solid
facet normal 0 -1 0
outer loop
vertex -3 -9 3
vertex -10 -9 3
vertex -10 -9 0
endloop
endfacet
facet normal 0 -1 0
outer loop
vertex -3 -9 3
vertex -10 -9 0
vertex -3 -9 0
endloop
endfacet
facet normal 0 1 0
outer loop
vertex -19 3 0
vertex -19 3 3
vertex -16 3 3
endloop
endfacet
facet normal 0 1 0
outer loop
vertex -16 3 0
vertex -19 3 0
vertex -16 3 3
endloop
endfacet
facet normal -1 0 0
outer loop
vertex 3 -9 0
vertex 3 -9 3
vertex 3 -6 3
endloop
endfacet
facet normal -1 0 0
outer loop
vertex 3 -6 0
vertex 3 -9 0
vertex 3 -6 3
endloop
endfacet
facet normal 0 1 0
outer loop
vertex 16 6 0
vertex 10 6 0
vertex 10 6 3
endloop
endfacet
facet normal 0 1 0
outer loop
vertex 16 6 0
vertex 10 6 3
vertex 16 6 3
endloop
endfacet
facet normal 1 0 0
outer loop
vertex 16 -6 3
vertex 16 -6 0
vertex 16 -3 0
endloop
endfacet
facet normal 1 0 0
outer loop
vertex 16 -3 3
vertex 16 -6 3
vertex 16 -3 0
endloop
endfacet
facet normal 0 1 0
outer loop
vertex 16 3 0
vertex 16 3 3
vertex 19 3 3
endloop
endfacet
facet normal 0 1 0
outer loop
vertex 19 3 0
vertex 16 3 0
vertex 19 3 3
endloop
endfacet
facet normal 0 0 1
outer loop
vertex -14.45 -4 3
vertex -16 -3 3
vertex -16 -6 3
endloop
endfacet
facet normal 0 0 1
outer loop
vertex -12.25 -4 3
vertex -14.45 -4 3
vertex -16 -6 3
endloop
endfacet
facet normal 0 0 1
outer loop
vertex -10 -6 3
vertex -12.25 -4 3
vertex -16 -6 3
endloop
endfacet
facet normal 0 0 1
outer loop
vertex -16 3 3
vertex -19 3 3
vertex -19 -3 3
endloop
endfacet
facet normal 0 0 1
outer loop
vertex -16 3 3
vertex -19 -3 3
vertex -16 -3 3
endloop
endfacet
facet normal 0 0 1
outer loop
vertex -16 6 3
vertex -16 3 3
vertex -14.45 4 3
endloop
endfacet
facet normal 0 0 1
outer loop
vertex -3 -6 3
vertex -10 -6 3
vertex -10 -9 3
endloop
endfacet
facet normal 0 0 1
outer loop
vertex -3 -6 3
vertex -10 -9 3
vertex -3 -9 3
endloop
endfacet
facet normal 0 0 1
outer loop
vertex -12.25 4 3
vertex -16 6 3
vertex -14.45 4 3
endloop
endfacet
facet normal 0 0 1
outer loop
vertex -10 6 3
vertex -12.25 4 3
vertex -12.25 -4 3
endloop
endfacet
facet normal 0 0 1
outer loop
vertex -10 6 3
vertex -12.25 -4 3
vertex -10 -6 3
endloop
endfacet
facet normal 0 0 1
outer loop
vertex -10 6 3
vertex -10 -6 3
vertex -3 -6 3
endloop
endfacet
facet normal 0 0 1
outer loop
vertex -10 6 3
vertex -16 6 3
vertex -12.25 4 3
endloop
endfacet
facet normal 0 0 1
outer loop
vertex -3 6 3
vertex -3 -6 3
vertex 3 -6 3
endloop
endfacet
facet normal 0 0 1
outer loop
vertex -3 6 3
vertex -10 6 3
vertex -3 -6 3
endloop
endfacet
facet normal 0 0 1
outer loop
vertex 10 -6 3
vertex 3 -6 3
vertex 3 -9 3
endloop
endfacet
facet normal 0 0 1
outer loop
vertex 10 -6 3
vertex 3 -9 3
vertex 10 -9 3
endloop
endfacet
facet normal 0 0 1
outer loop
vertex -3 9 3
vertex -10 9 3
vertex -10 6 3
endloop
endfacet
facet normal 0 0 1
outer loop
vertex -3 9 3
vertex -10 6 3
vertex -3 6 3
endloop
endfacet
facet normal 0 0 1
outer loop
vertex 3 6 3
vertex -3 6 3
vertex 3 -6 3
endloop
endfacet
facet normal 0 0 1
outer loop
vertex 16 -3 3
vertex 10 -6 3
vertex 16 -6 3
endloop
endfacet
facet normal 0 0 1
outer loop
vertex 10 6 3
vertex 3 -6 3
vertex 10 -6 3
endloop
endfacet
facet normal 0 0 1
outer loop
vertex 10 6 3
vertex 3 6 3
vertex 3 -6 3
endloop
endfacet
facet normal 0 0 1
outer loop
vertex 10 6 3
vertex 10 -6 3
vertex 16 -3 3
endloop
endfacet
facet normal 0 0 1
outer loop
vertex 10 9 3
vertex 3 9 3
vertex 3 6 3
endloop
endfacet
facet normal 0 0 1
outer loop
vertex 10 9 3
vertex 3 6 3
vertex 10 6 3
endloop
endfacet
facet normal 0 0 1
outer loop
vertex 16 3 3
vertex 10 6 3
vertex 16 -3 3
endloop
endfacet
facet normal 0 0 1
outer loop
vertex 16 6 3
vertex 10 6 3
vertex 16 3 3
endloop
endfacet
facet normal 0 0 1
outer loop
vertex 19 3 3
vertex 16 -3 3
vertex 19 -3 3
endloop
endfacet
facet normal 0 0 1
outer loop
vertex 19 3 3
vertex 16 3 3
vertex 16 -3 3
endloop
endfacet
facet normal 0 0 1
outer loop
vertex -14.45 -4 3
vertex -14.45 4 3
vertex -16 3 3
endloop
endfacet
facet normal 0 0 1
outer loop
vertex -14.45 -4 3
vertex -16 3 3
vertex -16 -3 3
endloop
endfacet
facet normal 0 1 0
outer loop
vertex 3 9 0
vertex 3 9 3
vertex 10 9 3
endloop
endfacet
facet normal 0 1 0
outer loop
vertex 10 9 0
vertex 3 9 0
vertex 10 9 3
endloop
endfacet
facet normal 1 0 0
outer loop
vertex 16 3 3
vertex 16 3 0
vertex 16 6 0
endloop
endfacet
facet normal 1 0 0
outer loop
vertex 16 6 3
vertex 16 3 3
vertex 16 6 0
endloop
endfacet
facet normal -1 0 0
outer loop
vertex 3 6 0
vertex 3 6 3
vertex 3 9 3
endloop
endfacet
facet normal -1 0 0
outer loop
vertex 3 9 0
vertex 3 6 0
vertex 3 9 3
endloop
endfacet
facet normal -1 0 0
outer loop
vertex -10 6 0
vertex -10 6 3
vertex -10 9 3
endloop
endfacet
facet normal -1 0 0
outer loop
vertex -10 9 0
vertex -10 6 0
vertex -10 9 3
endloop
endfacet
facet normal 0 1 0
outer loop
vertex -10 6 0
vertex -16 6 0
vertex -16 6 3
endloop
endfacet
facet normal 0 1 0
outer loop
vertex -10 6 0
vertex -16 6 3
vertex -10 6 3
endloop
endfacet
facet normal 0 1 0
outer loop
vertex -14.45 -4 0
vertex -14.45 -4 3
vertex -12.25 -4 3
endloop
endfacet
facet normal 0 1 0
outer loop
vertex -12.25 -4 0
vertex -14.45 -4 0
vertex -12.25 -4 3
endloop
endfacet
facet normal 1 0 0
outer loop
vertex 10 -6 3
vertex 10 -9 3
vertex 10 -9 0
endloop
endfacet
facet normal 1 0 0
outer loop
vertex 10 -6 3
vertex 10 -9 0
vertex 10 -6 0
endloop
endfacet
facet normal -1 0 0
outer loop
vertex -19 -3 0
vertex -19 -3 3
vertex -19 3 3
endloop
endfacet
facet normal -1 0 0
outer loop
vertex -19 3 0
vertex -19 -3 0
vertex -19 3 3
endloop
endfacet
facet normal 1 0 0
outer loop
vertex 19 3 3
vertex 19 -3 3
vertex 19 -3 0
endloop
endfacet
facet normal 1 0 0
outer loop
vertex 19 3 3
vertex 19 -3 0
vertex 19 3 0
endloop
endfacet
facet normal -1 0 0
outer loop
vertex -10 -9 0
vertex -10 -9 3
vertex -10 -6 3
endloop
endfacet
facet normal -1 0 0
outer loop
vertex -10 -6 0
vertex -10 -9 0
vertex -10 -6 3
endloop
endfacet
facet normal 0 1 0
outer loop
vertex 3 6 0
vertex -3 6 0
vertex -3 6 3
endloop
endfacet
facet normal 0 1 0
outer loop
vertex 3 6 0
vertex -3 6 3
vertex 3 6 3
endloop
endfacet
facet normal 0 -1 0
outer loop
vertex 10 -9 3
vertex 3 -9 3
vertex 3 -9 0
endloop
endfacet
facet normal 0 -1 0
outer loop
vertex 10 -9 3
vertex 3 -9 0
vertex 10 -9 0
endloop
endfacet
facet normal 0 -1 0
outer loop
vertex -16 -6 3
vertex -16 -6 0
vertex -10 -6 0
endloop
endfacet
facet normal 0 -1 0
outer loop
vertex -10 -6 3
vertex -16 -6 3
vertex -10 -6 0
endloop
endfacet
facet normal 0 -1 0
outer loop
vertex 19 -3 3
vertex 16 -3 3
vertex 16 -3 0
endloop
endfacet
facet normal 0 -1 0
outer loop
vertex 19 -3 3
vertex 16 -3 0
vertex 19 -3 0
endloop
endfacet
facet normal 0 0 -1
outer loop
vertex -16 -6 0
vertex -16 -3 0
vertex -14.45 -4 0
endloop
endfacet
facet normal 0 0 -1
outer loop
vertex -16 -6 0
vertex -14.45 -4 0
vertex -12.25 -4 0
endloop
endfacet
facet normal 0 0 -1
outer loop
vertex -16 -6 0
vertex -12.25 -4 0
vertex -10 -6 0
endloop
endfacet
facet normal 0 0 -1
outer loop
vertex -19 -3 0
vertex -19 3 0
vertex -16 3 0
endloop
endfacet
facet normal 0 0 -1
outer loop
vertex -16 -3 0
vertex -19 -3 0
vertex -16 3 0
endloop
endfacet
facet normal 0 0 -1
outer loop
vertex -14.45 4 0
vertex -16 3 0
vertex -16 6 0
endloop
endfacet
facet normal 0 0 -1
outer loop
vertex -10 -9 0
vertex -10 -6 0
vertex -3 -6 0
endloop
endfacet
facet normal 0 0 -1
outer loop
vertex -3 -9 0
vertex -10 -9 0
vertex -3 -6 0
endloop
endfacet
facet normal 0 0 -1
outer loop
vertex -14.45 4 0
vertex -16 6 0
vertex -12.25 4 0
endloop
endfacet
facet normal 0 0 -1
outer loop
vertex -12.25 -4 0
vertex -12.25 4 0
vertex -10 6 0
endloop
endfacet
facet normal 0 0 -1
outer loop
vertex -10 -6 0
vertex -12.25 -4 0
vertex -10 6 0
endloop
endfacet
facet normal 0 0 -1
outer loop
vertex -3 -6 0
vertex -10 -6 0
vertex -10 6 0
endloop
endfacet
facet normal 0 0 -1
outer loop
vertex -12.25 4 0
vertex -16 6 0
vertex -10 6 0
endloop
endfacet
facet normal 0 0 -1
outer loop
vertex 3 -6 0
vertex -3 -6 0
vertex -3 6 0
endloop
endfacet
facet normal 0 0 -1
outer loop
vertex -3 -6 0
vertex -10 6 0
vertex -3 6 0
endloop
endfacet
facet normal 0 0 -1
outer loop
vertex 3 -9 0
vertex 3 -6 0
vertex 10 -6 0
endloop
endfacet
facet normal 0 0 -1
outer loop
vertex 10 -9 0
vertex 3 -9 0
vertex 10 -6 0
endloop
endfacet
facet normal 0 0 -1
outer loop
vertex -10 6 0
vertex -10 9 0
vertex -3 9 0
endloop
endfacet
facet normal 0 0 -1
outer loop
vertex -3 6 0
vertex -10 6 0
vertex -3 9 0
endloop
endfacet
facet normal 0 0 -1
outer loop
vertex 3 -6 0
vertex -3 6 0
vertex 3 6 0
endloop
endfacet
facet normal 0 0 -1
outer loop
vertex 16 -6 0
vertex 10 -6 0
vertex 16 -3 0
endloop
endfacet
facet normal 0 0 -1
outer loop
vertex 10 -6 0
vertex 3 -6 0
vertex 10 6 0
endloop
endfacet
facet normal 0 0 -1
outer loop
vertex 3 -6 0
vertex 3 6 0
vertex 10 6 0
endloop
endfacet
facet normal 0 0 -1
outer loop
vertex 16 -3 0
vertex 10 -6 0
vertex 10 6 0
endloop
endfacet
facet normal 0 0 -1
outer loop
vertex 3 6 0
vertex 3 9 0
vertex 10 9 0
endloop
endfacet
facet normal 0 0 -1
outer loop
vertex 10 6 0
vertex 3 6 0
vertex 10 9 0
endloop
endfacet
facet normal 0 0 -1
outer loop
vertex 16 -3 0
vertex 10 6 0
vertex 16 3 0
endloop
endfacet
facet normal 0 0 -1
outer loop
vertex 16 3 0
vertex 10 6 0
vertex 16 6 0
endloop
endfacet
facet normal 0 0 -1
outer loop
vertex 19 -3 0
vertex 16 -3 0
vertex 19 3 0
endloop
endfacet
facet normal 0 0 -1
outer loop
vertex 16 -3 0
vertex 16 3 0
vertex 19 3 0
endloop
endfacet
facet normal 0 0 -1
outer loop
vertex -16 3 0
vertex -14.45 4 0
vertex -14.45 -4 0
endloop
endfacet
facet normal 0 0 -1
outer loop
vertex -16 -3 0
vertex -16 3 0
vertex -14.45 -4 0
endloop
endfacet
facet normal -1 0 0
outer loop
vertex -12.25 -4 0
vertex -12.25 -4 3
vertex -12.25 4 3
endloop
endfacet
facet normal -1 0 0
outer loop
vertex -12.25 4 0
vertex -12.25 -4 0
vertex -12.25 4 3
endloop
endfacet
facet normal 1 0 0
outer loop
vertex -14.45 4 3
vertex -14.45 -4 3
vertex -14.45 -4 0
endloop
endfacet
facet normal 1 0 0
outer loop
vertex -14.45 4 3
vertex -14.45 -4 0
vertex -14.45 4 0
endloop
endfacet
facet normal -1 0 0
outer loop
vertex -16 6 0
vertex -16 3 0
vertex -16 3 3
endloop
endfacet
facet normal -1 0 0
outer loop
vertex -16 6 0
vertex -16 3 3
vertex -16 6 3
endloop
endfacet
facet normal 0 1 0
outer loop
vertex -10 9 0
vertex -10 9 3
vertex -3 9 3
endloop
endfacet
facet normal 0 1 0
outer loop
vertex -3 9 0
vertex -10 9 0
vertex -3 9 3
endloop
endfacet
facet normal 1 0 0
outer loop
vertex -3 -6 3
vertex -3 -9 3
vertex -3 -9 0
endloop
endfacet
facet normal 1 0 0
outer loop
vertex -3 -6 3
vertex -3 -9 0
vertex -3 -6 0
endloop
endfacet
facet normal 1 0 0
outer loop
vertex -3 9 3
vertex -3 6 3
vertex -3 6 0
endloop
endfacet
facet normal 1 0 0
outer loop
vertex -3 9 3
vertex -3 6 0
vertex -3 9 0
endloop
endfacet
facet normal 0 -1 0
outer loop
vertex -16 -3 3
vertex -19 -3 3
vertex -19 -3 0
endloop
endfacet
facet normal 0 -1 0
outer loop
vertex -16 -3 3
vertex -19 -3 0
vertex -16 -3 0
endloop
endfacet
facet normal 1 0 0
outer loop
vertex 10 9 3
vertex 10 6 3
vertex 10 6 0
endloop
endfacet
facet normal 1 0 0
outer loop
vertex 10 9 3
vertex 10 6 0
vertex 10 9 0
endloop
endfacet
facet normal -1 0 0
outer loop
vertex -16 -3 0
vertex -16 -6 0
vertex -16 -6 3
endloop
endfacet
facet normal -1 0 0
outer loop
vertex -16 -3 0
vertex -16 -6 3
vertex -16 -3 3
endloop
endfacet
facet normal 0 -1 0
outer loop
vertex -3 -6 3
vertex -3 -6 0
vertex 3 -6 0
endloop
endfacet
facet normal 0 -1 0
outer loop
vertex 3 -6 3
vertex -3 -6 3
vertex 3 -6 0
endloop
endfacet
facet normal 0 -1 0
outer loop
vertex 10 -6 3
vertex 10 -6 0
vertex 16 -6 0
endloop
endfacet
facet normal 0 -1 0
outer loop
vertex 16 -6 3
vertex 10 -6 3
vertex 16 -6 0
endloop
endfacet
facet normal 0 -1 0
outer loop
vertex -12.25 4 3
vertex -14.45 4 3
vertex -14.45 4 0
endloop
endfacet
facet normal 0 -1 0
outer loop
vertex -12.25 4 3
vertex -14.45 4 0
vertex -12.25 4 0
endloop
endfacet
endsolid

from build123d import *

# Parameters (mm, degrees)
SKETCH2_W           = 32
SKETCH2_H           = 12
BOSS_EXTRUDE1_DEPTH = 3
SKETCH3_W           = 7
SKETCH3_H           = 3
SKETCH3_W_2         = 3
SKETCH3_H_2         = 6
BOSS_EXTRUDE3_DEPTH = 3
SKETCH4_W           = 2.2
SKETCH4_H           = 8
CUT_EXTRUDE1_DEPTH  = 3


with BuildPart() as part:
    # Sketch2 → Boss-Extrude1 (new body)
    with BuildSketch(Plane.XY):
        Rectangle(SKETCH2_W, SKETCH2_H)
    extrude(amount=BOSS_EXTRUDE1_DEPTH)

    # Sketch3 → Boss-Extrude3 (add)
    with BuildSketch(Plane.XY.offset(3)):
        with Locations((-6.5, -7.5)):
            Rectangle(SKETCH3_W, SKETCH3_H)
        with Locations((6.5, -7.5)):
            Rectangle(SKETCH3_W, SKETCH3_H)
        with Locations((6.5, 7.5)):
            Rectangle(SKETCH3_W, SKETCH3_H)
        with Locations((-6.5, 7.5)):
            Rectangle(SKETCH3_W, SKETCH3_H)
        with Locations((-17.5, 0)):
            Rectangle(SKETCH3_W_2, SKETCH3_H_2)
        with Locations((17.5, 0)):
            Rectangle(SKETCH3_W_2, SKETCH3_H_2)
    extrude(amount=-BOSS_EXTRUDE3_DEPTH)

    # Sketch4 → Cut-Extrude1 (cut)
    with BuildSketch(Plane.XY.offset(3)):
        with Locations((-13.35, 0)):
            Rectangle(SKETCH4_W, SKETCH4_H)
    extrude(amount=-CUT_EXTRUDE1_DEPTH, mode=Mode.SUBTRACT)


solid = part.part
